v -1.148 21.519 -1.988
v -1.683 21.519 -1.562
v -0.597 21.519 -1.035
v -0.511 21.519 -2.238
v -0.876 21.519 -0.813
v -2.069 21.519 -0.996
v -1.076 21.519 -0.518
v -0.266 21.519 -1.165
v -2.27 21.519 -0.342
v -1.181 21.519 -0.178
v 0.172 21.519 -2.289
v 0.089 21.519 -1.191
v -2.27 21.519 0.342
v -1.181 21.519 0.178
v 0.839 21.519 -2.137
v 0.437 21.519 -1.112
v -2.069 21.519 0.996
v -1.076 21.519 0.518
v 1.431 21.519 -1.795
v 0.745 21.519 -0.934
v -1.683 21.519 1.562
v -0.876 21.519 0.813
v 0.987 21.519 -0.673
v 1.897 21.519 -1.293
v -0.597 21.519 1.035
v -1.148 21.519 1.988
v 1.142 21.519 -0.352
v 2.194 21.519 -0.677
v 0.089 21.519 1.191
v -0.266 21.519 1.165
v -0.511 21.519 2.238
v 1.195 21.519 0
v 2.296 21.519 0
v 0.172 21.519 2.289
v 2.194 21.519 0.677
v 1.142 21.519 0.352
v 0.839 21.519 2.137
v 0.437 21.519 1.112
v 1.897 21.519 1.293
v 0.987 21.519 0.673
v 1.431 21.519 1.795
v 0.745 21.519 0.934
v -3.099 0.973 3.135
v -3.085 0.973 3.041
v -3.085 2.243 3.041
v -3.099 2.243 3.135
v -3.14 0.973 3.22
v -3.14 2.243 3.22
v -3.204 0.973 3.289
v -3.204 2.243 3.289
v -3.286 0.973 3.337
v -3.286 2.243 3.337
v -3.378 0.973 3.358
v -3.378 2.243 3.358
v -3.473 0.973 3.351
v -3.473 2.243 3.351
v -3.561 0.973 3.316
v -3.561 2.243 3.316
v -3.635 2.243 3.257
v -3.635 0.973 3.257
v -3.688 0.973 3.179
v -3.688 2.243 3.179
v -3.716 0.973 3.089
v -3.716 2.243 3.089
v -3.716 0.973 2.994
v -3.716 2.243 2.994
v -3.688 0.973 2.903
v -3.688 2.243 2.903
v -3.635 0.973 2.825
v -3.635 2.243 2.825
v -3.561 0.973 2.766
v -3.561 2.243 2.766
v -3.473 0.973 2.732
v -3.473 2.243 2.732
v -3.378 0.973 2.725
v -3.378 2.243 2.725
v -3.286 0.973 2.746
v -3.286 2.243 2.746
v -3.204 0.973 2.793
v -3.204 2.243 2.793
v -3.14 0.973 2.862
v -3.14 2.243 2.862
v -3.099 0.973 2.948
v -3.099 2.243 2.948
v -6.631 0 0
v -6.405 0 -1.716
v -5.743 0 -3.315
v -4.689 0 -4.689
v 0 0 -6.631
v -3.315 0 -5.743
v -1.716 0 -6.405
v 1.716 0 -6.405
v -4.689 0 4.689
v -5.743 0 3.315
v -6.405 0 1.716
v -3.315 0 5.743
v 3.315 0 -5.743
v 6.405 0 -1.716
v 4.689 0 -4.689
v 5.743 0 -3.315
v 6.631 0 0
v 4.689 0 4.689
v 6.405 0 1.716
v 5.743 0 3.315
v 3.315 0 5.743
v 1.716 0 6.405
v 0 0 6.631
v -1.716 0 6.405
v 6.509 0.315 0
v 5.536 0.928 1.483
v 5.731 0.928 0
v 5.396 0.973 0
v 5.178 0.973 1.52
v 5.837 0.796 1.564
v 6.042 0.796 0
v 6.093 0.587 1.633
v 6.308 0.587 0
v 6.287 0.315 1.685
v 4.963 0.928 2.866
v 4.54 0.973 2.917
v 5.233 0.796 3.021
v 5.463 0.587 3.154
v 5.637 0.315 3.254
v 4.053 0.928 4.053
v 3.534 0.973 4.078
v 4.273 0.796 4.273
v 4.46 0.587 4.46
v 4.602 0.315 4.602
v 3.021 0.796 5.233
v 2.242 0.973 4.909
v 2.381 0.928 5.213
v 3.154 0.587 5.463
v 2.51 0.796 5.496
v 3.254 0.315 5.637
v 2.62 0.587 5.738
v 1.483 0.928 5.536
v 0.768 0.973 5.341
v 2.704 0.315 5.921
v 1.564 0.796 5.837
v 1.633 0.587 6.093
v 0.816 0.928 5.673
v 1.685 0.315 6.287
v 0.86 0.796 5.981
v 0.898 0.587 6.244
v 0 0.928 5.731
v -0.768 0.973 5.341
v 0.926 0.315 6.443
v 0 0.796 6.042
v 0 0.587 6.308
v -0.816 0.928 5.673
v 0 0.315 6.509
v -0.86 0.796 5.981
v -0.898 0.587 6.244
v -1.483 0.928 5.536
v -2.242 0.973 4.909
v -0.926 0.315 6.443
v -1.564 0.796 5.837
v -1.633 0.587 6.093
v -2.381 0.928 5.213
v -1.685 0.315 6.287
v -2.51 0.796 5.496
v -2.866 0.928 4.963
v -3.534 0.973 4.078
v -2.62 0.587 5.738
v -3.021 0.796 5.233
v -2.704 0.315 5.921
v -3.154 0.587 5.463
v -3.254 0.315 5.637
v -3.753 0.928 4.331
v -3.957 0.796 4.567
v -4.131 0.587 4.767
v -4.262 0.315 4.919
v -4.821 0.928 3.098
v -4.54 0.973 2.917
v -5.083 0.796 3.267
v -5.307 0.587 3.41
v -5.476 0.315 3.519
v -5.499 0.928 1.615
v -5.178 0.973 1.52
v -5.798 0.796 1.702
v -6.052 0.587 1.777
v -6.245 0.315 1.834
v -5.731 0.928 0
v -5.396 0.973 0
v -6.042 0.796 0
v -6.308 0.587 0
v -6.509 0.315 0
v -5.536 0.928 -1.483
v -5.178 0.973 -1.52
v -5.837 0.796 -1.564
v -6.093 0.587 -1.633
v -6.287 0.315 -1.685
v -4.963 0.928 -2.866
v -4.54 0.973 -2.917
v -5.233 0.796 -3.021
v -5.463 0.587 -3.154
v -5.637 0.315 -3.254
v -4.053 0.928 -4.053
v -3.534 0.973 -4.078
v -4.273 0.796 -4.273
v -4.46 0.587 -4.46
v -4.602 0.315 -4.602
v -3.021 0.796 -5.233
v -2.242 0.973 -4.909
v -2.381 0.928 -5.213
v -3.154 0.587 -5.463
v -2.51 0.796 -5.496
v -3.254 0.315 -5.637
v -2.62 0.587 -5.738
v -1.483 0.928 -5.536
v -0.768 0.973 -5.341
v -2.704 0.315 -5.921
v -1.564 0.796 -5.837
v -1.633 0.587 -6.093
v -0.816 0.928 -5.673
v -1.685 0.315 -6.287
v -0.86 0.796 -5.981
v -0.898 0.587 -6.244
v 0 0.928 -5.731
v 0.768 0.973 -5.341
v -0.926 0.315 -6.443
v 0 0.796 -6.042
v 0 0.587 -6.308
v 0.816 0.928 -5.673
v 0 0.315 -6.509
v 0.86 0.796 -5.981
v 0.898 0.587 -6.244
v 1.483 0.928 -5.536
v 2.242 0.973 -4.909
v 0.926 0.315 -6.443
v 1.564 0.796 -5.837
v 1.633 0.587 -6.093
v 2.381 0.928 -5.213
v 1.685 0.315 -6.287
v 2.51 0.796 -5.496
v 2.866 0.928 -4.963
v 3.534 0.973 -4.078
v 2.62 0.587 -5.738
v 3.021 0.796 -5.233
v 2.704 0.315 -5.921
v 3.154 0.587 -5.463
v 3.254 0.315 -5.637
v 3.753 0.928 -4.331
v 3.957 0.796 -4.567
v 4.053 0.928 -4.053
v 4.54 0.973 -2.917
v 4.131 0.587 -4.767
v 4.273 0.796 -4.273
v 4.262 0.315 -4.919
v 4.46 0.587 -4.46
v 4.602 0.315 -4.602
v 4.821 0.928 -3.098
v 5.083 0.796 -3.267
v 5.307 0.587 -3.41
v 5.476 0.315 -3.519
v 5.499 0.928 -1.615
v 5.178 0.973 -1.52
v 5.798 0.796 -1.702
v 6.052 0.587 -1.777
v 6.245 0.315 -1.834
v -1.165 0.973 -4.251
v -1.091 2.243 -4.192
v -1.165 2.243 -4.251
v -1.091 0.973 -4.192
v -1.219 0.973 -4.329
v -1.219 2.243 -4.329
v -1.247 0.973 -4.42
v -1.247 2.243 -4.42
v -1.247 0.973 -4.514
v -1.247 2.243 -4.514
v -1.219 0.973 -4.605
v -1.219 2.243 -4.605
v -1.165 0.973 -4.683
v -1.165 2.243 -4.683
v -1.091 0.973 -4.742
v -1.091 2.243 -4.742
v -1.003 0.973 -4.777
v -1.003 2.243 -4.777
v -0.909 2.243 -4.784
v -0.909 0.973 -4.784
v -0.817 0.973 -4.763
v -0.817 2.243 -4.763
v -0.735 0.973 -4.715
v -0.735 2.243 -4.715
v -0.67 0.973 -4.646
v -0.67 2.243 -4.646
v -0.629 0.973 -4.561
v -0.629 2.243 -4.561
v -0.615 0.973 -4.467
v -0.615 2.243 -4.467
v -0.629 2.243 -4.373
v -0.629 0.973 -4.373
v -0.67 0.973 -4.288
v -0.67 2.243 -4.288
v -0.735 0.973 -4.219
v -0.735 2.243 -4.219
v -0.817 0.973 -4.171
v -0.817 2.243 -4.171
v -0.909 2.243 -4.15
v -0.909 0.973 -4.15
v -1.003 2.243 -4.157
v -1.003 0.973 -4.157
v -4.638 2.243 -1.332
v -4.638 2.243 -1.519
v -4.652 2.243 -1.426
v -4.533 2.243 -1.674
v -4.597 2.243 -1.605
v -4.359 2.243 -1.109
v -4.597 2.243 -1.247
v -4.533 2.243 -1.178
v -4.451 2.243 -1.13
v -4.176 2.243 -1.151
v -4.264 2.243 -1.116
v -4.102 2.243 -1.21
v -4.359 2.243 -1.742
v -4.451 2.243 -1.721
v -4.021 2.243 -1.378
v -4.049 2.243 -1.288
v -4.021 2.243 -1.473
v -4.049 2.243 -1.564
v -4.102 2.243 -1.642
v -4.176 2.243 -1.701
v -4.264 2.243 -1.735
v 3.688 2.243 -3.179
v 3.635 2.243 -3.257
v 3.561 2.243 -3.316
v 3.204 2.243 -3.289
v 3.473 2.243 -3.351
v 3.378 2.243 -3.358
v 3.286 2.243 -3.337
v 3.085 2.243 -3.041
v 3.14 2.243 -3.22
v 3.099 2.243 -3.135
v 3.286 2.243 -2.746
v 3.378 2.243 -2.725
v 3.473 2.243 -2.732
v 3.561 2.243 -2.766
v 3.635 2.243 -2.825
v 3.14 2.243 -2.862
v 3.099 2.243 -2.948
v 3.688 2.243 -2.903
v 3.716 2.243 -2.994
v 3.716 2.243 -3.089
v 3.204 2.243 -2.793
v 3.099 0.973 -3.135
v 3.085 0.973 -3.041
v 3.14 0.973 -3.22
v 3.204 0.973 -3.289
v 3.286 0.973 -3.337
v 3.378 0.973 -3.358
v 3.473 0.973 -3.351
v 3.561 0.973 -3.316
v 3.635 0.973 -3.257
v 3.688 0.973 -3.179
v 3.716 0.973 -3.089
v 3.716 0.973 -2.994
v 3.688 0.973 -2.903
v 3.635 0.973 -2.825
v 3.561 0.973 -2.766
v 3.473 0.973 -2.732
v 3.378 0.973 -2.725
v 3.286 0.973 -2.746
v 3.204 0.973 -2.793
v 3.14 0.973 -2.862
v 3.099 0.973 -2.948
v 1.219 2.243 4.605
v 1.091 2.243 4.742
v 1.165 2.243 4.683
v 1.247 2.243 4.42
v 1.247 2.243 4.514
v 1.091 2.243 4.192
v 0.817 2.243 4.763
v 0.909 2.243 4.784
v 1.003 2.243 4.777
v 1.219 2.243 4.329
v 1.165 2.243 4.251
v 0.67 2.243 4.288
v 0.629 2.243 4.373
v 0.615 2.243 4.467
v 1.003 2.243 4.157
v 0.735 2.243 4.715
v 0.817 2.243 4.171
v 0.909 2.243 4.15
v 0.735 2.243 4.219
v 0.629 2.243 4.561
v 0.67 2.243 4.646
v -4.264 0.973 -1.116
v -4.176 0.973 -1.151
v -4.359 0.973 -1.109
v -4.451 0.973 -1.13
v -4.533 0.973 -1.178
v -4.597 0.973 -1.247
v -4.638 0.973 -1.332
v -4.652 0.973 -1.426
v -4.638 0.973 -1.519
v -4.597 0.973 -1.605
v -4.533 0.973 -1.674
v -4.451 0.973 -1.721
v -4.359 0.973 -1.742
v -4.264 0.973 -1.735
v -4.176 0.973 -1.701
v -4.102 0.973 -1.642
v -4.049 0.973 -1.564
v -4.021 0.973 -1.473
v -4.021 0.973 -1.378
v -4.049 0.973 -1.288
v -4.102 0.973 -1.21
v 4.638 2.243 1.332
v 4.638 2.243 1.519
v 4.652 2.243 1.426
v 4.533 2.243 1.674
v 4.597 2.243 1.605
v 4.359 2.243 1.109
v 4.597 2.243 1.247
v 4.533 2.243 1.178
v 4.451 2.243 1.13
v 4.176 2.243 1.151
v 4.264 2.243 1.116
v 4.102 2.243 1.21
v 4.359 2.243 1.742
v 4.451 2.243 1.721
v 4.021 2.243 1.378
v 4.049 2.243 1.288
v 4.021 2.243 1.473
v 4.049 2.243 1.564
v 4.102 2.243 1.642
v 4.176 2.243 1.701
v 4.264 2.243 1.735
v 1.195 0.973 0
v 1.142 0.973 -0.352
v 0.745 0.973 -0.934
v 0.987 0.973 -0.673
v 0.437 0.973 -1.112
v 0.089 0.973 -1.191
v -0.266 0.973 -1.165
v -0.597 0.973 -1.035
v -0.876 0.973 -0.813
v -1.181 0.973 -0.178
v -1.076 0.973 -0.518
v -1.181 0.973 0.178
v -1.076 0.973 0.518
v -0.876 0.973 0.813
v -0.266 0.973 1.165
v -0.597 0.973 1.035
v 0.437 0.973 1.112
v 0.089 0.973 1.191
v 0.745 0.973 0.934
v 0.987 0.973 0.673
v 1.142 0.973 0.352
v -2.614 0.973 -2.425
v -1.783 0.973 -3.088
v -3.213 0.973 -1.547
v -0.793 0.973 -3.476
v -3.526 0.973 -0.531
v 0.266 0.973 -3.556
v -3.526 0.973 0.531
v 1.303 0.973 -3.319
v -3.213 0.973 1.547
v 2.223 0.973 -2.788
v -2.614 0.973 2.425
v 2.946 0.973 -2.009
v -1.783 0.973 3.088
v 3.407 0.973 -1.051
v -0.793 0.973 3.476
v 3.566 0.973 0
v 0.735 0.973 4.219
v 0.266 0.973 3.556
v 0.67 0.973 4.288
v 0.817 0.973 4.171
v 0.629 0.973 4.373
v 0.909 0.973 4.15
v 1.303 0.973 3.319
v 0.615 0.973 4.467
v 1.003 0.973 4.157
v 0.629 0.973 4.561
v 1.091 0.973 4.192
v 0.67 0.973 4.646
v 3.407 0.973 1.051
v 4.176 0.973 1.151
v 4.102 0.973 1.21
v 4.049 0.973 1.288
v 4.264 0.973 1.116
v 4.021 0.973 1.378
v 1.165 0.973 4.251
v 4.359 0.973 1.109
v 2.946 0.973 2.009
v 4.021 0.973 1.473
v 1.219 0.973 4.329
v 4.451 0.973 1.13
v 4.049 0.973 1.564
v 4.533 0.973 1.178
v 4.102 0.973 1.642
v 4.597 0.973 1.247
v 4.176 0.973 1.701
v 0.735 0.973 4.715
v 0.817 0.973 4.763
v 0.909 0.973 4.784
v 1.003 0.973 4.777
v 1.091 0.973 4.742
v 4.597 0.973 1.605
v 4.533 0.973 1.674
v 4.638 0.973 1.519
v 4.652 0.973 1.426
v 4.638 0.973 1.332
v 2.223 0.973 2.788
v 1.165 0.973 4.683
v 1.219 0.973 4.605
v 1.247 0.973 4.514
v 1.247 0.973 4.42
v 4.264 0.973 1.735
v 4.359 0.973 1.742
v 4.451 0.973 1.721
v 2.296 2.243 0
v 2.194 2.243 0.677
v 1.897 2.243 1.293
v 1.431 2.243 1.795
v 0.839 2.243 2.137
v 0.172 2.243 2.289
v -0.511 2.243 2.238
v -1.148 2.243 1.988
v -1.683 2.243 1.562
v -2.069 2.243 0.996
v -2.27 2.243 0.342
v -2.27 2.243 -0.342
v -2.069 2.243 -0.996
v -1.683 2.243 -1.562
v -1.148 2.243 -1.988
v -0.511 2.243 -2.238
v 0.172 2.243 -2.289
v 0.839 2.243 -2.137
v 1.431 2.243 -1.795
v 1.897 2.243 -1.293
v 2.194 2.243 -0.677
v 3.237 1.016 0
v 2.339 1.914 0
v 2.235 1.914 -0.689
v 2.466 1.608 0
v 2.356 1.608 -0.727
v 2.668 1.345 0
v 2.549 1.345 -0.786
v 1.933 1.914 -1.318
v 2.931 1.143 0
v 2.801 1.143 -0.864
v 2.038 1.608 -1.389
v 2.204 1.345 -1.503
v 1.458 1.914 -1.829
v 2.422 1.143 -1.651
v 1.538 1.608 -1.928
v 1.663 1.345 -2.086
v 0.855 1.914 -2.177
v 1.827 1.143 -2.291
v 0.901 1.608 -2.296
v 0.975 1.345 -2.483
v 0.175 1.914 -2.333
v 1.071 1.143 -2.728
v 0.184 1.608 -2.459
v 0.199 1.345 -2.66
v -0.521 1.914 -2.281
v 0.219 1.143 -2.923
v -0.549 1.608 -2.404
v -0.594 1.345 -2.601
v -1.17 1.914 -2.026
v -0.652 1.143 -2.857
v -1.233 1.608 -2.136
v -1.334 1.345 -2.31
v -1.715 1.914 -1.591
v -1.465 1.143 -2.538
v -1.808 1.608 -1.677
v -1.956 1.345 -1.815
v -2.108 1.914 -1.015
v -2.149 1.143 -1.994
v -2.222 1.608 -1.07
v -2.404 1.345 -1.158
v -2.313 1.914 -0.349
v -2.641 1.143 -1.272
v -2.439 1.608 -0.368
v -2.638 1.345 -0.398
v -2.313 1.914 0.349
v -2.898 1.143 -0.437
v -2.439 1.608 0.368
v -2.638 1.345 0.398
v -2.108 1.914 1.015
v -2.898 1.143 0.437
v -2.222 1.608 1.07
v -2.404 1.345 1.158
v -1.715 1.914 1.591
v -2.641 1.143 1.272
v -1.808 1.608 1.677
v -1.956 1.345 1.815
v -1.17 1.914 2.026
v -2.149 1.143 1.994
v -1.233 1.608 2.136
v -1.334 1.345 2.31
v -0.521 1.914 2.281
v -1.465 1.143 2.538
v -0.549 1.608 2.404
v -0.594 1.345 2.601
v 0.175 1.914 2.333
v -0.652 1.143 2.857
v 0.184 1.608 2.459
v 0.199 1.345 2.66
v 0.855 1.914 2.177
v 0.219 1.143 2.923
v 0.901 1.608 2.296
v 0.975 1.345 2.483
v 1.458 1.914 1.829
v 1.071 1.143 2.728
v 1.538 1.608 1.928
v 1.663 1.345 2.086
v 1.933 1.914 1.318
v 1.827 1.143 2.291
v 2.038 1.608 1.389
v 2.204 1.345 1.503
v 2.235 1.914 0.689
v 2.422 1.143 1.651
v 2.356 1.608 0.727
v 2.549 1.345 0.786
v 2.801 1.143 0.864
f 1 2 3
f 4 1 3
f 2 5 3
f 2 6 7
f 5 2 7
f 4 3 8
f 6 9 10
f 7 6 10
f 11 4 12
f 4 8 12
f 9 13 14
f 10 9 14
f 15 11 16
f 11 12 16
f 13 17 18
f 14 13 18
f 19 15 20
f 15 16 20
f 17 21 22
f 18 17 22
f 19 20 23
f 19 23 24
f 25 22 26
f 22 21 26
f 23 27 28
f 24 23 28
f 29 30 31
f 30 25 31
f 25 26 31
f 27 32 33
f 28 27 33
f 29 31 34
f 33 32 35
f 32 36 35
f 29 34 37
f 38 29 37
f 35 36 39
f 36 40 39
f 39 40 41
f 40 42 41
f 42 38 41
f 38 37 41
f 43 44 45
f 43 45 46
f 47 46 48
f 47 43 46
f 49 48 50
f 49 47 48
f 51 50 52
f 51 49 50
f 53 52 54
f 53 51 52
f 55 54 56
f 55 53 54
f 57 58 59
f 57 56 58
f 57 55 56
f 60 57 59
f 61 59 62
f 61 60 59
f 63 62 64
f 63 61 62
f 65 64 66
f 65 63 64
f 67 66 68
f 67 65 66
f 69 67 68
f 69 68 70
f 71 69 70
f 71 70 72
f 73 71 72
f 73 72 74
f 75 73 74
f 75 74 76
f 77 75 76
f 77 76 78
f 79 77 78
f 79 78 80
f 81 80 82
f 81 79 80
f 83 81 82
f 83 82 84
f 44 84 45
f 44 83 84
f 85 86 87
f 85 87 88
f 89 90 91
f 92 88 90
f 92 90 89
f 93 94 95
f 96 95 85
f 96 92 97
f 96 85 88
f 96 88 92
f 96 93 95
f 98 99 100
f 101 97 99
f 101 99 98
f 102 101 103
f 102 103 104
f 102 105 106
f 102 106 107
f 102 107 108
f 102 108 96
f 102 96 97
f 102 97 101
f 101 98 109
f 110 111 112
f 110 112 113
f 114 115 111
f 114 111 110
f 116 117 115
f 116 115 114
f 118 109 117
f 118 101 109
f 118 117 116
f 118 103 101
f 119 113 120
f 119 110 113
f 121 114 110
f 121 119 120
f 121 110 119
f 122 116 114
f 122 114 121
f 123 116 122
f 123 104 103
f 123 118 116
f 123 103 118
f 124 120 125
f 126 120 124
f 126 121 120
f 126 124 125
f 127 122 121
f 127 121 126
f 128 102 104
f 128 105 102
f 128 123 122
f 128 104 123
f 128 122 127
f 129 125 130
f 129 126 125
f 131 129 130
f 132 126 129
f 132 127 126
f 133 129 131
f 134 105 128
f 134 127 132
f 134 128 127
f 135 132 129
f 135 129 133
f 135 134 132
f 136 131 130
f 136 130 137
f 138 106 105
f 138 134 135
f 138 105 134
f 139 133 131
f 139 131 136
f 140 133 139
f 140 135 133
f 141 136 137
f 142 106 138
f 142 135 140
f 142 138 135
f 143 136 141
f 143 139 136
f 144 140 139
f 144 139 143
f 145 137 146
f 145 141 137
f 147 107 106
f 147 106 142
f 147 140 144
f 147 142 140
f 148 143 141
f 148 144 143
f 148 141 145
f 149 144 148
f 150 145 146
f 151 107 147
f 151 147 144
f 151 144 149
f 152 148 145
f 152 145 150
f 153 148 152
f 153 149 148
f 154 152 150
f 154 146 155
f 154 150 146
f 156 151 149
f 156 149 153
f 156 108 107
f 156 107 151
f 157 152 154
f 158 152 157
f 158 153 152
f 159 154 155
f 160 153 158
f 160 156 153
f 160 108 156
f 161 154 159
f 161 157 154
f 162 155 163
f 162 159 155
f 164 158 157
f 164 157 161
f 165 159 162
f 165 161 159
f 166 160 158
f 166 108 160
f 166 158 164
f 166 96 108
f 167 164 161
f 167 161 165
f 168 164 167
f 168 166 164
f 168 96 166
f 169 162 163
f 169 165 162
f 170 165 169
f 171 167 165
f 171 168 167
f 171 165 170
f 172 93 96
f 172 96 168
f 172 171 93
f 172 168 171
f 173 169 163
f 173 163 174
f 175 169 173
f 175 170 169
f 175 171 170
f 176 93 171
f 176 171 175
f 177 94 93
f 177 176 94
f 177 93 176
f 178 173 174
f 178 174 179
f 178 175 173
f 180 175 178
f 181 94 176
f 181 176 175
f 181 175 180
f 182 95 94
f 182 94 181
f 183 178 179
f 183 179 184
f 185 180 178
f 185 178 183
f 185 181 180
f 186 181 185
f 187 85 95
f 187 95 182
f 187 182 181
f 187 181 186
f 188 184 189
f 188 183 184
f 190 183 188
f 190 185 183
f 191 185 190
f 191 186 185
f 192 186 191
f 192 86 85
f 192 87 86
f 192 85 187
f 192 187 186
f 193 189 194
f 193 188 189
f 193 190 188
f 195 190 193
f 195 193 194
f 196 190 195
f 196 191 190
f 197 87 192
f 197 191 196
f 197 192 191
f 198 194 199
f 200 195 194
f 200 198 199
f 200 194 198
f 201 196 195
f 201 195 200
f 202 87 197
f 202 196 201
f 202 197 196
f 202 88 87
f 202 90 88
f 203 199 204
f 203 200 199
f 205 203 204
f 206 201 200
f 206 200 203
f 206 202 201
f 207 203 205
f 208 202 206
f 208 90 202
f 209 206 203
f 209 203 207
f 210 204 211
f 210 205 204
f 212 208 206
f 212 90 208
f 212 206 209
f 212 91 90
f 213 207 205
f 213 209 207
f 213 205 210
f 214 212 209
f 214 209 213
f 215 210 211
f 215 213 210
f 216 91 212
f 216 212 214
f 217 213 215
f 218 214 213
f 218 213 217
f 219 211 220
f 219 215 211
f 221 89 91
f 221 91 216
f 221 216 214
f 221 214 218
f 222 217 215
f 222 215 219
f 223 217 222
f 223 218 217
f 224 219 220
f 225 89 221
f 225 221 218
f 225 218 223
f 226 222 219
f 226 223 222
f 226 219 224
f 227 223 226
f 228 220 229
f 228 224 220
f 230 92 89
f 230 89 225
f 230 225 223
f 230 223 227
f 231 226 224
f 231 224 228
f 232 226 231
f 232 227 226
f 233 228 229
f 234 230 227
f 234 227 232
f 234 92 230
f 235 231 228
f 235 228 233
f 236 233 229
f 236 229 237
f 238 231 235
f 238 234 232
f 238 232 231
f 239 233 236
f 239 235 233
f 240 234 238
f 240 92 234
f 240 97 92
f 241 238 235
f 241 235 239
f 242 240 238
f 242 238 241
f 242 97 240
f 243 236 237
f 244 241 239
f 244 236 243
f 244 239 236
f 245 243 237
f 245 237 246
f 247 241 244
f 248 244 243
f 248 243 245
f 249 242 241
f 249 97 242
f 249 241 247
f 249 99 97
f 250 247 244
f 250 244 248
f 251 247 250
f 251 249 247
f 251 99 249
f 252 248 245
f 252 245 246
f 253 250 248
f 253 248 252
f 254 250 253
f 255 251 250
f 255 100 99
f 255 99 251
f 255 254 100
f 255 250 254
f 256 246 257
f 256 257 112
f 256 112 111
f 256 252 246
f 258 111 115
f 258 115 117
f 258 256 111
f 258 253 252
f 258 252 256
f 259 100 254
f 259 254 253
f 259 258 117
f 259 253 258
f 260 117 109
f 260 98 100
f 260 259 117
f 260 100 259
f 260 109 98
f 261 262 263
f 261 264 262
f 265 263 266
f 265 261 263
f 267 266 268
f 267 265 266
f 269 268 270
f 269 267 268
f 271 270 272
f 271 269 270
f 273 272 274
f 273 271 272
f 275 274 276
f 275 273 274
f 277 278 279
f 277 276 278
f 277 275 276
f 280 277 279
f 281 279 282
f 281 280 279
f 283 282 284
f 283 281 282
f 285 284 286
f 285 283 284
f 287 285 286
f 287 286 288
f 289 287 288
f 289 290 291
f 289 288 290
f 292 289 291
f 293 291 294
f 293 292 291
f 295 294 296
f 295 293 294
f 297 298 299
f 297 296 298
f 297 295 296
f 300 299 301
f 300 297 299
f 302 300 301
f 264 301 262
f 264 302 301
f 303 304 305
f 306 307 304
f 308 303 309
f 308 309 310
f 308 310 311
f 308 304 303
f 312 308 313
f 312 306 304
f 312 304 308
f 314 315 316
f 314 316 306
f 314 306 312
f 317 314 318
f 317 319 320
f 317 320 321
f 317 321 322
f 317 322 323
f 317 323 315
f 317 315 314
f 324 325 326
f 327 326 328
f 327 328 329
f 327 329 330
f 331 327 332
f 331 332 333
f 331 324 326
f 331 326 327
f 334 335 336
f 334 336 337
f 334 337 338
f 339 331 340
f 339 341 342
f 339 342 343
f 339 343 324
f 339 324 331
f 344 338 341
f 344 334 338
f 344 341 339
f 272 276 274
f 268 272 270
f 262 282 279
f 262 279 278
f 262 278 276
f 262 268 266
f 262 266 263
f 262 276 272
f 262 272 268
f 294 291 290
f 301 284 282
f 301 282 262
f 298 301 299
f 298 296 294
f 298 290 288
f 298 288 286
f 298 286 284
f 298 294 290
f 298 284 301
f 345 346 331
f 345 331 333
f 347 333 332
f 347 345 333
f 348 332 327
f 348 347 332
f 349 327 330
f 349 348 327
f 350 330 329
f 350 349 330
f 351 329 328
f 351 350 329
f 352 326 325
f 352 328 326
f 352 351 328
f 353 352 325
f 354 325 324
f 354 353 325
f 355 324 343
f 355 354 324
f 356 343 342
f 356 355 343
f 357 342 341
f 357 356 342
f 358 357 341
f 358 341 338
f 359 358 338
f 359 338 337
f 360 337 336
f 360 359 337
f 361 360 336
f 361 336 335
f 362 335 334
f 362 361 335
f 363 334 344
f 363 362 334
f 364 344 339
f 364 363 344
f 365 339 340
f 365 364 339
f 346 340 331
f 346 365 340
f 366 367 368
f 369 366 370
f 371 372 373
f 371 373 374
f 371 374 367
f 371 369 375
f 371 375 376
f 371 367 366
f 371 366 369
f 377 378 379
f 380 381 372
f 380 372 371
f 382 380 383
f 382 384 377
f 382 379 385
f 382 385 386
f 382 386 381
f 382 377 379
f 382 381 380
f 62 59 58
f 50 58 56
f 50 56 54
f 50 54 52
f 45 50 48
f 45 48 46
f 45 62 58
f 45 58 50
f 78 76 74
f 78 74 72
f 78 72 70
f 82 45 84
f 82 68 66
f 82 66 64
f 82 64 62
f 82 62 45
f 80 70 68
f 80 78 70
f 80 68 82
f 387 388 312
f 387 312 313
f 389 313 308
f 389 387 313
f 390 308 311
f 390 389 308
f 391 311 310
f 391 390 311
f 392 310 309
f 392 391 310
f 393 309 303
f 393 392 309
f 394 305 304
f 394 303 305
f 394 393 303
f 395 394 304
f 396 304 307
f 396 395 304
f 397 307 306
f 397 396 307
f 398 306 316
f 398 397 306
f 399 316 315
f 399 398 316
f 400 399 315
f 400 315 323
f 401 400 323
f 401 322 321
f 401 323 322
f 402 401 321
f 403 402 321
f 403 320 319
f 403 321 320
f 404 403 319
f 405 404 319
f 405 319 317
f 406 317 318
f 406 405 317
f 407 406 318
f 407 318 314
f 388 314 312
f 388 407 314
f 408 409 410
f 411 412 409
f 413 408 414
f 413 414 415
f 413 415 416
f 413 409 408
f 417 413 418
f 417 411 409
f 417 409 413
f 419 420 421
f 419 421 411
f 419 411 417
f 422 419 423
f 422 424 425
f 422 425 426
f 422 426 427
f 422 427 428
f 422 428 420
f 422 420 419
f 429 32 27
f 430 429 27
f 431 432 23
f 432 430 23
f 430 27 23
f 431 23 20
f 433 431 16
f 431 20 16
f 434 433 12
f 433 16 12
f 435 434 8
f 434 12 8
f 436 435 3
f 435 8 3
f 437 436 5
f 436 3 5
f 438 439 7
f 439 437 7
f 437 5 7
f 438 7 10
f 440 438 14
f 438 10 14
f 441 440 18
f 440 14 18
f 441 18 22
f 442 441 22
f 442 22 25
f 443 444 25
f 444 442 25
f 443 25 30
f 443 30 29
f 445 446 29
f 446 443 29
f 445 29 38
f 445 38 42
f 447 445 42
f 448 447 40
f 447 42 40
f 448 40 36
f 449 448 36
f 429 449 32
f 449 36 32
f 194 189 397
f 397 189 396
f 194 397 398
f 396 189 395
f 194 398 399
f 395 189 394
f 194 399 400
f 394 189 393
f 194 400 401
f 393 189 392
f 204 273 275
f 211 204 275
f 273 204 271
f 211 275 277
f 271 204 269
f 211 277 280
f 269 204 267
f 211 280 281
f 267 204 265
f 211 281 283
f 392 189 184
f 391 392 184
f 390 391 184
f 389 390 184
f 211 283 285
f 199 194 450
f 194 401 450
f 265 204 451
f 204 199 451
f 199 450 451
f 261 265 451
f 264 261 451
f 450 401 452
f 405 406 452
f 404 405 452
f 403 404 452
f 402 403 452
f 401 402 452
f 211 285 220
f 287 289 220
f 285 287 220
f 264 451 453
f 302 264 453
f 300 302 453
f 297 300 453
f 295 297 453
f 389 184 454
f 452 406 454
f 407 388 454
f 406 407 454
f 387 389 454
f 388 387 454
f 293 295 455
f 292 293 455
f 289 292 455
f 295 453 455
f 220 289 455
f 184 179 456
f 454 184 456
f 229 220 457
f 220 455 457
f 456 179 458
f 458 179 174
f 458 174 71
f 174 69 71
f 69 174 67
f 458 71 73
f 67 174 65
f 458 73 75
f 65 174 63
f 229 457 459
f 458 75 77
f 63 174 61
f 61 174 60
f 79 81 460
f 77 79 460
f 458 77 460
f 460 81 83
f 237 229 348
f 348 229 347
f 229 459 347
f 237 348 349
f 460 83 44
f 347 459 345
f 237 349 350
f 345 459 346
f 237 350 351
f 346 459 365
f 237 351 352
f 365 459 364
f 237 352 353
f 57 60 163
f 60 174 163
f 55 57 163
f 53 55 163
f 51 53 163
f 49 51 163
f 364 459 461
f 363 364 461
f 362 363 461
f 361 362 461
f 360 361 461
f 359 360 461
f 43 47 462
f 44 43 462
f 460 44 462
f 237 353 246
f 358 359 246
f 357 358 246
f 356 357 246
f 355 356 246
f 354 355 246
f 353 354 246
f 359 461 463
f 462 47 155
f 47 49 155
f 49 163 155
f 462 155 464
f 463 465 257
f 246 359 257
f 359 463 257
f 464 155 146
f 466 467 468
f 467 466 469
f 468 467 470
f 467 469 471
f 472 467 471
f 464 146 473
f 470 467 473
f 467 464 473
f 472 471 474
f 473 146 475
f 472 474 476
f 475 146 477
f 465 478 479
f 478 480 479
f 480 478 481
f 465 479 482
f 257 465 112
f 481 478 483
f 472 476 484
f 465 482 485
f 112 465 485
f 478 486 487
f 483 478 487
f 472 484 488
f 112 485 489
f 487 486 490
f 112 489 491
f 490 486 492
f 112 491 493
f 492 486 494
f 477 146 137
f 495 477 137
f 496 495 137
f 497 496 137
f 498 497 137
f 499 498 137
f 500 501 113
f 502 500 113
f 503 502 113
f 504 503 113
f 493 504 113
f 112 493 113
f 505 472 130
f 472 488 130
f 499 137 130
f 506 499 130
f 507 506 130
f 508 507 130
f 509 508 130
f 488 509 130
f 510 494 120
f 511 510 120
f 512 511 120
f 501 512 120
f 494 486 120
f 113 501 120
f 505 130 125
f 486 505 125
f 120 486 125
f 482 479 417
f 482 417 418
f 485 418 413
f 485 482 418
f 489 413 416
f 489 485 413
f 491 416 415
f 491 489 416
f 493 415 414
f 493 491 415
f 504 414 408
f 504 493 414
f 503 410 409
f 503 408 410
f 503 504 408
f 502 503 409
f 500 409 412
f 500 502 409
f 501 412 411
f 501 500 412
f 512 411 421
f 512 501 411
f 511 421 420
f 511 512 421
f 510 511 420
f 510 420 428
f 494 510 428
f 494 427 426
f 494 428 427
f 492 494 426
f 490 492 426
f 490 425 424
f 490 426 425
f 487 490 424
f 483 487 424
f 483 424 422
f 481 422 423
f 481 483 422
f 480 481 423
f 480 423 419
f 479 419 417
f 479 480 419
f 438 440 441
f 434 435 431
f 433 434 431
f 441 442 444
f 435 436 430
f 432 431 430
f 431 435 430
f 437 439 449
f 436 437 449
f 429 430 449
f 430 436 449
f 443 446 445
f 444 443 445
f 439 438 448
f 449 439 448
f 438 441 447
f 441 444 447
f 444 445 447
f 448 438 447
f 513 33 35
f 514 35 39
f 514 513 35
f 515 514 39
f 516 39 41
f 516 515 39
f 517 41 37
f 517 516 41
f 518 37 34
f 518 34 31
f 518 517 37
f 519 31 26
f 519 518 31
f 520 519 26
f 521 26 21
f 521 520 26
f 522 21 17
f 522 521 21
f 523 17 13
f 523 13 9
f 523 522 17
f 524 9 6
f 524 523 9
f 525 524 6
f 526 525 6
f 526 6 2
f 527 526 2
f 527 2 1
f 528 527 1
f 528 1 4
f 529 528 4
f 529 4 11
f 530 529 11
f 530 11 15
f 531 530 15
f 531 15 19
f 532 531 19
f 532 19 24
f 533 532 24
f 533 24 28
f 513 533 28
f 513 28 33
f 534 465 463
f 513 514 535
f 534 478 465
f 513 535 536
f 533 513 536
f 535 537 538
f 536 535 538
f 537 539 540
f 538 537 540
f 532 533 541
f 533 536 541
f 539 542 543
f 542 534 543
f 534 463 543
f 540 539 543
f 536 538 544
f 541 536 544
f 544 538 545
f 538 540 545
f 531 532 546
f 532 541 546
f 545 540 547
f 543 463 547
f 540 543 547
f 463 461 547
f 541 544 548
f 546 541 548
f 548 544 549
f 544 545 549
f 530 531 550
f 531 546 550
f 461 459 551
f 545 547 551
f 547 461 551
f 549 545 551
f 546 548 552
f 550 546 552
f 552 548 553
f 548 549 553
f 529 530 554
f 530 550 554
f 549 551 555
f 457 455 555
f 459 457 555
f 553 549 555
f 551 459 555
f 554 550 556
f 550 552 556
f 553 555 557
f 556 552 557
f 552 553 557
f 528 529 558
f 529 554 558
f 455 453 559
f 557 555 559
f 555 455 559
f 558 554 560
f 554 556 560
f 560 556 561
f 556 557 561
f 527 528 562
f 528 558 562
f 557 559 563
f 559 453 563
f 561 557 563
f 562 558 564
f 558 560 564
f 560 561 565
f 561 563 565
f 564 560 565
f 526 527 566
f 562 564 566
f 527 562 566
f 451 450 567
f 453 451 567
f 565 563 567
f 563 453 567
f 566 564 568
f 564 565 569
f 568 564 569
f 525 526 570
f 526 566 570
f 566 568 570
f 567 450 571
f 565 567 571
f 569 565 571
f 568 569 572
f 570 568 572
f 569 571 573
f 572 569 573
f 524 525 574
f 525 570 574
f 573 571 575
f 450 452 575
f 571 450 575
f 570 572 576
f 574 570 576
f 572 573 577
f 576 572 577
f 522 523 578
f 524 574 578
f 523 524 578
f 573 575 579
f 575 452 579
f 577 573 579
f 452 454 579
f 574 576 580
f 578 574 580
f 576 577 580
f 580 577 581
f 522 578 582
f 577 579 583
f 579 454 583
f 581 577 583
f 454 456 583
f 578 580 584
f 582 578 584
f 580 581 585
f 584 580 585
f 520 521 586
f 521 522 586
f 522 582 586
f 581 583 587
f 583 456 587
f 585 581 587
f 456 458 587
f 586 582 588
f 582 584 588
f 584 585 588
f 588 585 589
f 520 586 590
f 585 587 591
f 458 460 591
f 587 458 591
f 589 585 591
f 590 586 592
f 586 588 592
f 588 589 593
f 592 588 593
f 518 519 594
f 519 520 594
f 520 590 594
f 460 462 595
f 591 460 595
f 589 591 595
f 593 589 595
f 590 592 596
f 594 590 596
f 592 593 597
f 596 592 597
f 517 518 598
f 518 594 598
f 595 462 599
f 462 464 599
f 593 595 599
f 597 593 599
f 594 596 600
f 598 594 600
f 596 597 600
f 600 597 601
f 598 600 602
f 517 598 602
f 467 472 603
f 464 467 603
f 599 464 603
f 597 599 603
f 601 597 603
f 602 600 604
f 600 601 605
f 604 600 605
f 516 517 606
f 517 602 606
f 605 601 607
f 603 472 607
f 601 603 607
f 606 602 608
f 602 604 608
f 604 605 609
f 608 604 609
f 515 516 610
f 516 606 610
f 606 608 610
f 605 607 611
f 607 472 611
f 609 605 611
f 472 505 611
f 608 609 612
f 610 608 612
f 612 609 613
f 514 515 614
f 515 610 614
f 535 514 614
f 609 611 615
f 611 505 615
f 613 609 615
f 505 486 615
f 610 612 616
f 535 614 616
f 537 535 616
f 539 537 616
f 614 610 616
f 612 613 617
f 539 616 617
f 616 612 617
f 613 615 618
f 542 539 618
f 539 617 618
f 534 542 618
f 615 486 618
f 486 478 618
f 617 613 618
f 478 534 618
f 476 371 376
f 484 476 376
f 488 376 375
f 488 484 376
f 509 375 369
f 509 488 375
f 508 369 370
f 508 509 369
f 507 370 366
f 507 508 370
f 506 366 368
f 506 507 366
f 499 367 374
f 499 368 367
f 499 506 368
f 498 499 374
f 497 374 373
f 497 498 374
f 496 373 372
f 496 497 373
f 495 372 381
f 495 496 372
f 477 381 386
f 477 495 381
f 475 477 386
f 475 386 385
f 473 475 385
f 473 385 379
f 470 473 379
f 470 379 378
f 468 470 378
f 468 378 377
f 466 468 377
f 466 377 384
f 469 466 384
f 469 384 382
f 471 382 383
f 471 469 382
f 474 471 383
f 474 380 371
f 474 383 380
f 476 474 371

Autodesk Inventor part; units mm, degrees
ref_plane "YZ Plane" through (0, 0, 0) normal (1, 0, 0) x (0, 1, 0)
ref_plane "XZ Plane" through (0, 0, 0) normal (0, 1, 0) x (-1, 0, 0)
ref_plane "XY Plane" through (0, 0, 0) normal (0, 0, 1) x (1, 0, 0)
sketch "Sketch1" plane through (0, 0, 0) normal (0, 0, 1) x (1, 0, 0)
  line L0 (1.1948, 21.5189) -> (2.2959, 21.5189)
  line L1 (6.6309, 0) -> (1.1948, 0)
  line L2 (1.1948, 0.9728) -> (1.1948, 21.5189)
  line L3 (2.2959, 21.5189) -> (2.2959, 0.9728)
  line L4 (2.2959, 0.9728) -> (6.6309, 0.9728)
  line L5 (6.6309, 0.9728) -> (6.6309, 0)
  line L6 (1.1948, 0.9728) -> (0, 0.9728)
  line L7 (0, 0.9728) -> (0, 0)
  line L8 (0, 0) -> (1.1948, 0)
revolve "Revolution1" add sketch "Sketch1" angle 360 about axis through (0, 0.9728, 0) along (0, -1, 0)
fillet "Fillet1" radius 1.27 1 edges at (-2.2959, 0.9728, 0)
fillet "Fillet2" radius 1.27 1 edges at (-6.6309, 0.9728, 0)
sketch "Sketch2" plane through (0, 0.9728, 0) normal (0, 1, 0) x (1, 0, 0)
  circle A0 centre (0, 0) radius 3.5659 projected
  circle A1 centre (0, 0) radius 5.3961 projected
  circle A2 centre (-0.0164, -4.5633) radius 0.3175
  circle A3 centre (1.841, -4.1755) radius 0.3175
  circle A4 centre (3.3802, -3.0657) radius 0.3175
  circle A5 centre (4.3349, -1.4258) radius 0.3175
  circle A6 centre (4.54, 0.4606) radius 0.3175
  circle A7 centre (3.9602, 2.2674) radius 0.3175
  circle A8 centre (2.6955, 3.6821) radius 0.3175
  circle A9 centre (0.9648, 4.4602) radius 0.3175
  circle A10 centre (-0.9327, 4.467) radius 0.3175
  circle A11 centre (-2.6689, 3.7015) radius 0.3175
  circle A12 centre (-3.9437, 2.2959) radius 0.3175
  circle A13 centre (-4.5366, 0.4933) radius 0.3175
  circle A14 centre (-4.345, -1.3945) radius 0.3175
  circle A15 centre (-3.4022, -3.0412) radius 0.3175
  circle A16 centre (-1.8711, -4.1621) radius 0.3175
  point P0 (0, 0)
  dimension "d3" = 0.635
  dimension "d6" = 360
extrude "Extrusion1" add sketch "Sketch2" along normal blind 1.27 contours A15
pattern_circular "Circular Pattern1" count 6 over 360 about axis through (0, -10, 0) along (0, 1, 0) of "Extrusion1"
properties part number "flume-nursery"
